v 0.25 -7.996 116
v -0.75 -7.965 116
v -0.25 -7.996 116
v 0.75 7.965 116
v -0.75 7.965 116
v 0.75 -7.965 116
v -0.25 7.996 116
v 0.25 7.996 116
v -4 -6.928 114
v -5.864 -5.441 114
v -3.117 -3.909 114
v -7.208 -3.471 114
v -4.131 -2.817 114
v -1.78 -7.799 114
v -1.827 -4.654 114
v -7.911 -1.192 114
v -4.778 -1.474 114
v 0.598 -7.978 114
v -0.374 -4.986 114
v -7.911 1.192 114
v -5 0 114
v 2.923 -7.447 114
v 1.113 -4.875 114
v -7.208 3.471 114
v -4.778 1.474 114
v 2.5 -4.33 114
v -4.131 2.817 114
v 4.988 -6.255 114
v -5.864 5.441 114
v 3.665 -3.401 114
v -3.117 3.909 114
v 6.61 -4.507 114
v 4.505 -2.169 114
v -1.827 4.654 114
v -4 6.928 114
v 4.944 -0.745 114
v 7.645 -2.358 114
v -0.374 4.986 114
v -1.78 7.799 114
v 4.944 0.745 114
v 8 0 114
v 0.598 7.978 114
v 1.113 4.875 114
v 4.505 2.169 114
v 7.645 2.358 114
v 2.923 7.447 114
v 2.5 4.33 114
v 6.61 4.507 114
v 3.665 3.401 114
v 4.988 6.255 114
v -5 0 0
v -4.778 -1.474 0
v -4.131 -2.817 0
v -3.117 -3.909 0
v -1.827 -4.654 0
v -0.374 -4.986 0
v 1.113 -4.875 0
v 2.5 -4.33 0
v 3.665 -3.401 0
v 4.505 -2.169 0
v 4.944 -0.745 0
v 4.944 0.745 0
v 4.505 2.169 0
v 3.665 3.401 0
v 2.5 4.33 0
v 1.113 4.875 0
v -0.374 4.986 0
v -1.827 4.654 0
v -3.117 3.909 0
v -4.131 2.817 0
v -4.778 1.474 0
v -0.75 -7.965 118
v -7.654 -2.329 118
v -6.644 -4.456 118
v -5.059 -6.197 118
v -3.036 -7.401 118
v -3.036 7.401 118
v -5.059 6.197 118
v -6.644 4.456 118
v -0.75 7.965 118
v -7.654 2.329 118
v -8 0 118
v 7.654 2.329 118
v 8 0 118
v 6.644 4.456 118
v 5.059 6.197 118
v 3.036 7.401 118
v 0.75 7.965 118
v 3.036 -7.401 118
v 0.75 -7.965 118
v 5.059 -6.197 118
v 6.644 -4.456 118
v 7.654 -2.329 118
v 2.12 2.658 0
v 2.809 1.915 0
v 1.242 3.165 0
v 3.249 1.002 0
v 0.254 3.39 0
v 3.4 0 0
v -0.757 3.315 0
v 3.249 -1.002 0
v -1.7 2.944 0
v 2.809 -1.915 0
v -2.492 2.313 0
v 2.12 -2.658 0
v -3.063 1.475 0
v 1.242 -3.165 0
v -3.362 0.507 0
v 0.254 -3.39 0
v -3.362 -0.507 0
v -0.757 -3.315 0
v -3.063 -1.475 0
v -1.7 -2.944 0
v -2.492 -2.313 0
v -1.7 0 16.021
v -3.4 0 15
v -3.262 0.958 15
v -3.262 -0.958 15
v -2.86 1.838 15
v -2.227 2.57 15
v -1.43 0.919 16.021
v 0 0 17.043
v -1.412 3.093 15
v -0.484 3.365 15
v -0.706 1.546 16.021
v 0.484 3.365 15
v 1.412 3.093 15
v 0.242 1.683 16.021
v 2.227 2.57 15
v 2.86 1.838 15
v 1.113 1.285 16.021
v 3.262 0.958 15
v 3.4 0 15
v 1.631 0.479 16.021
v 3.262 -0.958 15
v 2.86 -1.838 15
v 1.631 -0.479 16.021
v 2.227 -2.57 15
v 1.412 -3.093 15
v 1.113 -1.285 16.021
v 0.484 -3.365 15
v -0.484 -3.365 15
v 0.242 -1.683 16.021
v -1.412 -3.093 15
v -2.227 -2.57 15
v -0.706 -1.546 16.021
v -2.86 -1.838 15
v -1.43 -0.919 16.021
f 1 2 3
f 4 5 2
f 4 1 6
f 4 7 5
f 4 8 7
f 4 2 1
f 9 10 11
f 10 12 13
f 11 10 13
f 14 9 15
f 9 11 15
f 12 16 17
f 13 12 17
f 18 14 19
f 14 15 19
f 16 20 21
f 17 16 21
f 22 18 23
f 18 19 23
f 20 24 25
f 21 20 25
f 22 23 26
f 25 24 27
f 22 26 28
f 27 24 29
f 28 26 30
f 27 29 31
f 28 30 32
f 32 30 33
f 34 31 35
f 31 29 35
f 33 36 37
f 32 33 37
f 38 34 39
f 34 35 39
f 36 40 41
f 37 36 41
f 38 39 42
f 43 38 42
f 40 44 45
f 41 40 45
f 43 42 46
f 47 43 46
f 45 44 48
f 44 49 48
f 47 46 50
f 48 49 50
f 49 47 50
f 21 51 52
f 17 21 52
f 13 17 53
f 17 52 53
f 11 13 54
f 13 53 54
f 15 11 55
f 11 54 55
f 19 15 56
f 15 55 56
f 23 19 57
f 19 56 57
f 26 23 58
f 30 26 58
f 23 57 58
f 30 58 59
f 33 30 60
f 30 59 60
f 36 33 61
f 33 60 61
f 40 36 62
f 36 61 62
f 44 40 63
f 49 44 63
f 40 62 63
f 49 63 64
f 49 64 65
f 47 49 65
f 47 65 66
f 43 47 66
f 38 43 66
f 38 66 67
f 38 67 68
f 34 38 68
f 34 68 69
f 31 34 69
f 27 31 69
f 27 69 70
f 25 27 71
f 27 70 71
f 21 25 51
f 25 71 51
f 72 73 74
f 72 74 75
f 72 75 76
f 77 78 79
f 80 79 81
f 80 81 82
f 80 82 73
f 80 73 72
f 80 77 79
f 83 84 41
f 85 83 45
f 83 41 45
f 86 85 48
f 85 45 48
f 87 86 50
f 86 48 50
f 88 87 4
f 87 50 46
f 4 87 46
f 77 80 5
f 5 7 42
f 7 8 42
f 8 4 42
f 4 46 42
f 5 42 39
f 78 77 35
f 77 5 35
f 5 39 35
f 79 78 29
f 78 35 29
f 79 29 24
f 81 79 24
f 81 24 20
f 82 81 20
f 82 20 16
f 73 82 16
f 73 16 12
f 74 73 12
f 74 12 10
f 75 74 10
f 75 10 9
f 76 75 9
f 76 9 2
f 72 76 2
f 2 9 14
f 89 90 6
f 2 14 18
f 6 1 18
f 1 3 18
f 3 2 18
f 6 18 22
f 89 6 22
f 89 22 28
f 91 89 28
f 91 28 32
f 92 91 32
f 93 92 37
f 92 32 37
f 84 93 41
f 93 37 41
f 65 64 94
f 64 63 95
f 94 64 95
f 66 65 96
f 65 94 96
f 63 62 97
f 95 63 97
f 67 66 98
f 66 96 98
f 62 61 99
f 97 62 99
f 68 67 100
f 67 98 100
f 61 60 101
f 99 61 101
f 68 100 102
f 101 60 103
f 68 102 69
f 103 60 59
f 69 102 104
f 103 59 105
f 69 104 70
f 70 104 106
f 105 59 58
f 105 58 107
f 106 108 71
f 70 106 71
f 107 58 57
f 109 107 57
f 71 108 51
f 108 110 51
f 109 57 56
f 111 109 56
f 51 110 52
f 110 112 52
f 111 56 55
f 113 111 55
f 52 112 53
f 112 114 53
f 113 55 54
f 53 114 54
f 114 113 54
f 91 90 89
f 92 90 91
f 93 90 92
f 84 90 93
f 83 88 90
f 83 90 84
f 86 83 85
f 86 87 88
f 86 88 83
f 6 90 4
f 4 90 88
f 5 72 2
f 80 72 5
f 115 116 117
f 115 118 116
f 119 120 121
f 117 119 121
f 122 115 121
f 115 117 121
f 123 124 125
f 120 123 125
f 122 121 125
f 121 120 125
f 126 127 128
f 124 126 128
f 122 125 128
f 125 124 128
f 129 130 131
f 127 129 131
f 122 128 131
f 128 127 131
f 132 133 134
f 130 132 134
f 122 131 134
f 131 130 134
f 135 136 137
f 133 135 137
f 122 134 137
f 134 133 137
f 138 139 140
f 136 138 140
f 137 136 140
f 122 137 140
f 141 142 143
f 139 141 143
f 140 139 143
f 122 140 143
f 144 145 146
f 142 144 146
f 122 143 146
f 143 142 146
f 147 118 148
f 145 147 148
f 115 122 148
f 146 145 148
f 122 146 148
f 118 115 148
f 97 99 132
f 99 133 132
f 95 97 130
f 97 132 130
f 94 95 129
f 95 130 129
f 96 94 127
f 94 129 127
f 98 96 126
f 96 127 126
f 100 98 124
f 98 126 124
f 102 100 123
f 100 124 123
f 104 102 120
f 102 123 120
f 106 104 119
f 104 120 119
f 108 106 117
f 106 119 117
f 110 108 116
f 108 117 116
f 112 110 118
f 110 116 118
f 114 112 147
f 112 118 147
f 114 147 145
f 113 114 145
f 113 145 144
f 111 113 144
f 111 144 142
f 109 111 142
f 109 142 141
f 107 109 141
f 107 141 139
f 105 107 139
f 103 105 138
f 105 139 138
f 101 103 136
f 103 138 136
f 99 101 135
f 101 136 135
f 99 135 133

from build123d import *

# Parameters (mm, degrees)
SKETCH_1_R             = 5
EXTRUDE_1_DEPTH        = 114
SKETCH_2_R             = 8
EXTRUDE_2_DEPTH        = 4
SKETCH_4_W             = 1.5
SKETCH_4_H             = 19.56005024
CUT_EXTRUDE_1_DEPTH    = 2
HOLE_WIZARD_M8_1_D     = 6.8
HOLE_WIZARD_M8_1_DEPTH = 15
HOLE_WIZARD_M8_1_TIP   = 2.042926105


with BuildPart() as part:
    # 草图1 → 凸台-拉伸1 (new body)
    with BuildSketch(Plane.XY):
        with Locations(Location((0, 0, 0), (0, 0, 180))):
            Circle(SKETCH_1_R)
    extrude(amount=EXTRUDE_1_DEPTH)

    # 草图2 → 凸台-拉伸2 (add)
    with BuildSketch(Plane.XY.offset(114)):
        Circle(SKETCH_2_R)
    extrude(amount=EXTRUDE_2_DEPTH)

    # 草图4 → 切除-拉伸1 (cut)
    with BuildSketch(Plane.XY.offset(118)):
        Rectangle(SKETCH_4_W, SKETCH_4_H)
    extrude(amount=-CUT_EXTRUDE_1_DEPTH, mode=Mode.SUBTRACT)

    # M8 螺纹孔的螺纹孔钻头1
    with Locations(Plane(origin=(0, 0, 0), x_dir=(-1, 0, 0), z_dir=(0, 0, -1))):
        with Locations((0, 0)):
            Hole(HOLE_WIZARD_M8_1_D / 2, depth=HOLE_WIZARD_M8_1_DEPTH)
            with Locations((0, 0, -(HOLE_WIZARD_M8_1_DEPTH + HOLE_WIZARD_M8_1_TIP / 2))):  # 118° drill point
                Cone(0, HOLE_WIZARD_M8_1_D / 2, HOLE_WIZARD_M8_1_TIP, mode=Mode.SUBTRACT)


solid = part.part
